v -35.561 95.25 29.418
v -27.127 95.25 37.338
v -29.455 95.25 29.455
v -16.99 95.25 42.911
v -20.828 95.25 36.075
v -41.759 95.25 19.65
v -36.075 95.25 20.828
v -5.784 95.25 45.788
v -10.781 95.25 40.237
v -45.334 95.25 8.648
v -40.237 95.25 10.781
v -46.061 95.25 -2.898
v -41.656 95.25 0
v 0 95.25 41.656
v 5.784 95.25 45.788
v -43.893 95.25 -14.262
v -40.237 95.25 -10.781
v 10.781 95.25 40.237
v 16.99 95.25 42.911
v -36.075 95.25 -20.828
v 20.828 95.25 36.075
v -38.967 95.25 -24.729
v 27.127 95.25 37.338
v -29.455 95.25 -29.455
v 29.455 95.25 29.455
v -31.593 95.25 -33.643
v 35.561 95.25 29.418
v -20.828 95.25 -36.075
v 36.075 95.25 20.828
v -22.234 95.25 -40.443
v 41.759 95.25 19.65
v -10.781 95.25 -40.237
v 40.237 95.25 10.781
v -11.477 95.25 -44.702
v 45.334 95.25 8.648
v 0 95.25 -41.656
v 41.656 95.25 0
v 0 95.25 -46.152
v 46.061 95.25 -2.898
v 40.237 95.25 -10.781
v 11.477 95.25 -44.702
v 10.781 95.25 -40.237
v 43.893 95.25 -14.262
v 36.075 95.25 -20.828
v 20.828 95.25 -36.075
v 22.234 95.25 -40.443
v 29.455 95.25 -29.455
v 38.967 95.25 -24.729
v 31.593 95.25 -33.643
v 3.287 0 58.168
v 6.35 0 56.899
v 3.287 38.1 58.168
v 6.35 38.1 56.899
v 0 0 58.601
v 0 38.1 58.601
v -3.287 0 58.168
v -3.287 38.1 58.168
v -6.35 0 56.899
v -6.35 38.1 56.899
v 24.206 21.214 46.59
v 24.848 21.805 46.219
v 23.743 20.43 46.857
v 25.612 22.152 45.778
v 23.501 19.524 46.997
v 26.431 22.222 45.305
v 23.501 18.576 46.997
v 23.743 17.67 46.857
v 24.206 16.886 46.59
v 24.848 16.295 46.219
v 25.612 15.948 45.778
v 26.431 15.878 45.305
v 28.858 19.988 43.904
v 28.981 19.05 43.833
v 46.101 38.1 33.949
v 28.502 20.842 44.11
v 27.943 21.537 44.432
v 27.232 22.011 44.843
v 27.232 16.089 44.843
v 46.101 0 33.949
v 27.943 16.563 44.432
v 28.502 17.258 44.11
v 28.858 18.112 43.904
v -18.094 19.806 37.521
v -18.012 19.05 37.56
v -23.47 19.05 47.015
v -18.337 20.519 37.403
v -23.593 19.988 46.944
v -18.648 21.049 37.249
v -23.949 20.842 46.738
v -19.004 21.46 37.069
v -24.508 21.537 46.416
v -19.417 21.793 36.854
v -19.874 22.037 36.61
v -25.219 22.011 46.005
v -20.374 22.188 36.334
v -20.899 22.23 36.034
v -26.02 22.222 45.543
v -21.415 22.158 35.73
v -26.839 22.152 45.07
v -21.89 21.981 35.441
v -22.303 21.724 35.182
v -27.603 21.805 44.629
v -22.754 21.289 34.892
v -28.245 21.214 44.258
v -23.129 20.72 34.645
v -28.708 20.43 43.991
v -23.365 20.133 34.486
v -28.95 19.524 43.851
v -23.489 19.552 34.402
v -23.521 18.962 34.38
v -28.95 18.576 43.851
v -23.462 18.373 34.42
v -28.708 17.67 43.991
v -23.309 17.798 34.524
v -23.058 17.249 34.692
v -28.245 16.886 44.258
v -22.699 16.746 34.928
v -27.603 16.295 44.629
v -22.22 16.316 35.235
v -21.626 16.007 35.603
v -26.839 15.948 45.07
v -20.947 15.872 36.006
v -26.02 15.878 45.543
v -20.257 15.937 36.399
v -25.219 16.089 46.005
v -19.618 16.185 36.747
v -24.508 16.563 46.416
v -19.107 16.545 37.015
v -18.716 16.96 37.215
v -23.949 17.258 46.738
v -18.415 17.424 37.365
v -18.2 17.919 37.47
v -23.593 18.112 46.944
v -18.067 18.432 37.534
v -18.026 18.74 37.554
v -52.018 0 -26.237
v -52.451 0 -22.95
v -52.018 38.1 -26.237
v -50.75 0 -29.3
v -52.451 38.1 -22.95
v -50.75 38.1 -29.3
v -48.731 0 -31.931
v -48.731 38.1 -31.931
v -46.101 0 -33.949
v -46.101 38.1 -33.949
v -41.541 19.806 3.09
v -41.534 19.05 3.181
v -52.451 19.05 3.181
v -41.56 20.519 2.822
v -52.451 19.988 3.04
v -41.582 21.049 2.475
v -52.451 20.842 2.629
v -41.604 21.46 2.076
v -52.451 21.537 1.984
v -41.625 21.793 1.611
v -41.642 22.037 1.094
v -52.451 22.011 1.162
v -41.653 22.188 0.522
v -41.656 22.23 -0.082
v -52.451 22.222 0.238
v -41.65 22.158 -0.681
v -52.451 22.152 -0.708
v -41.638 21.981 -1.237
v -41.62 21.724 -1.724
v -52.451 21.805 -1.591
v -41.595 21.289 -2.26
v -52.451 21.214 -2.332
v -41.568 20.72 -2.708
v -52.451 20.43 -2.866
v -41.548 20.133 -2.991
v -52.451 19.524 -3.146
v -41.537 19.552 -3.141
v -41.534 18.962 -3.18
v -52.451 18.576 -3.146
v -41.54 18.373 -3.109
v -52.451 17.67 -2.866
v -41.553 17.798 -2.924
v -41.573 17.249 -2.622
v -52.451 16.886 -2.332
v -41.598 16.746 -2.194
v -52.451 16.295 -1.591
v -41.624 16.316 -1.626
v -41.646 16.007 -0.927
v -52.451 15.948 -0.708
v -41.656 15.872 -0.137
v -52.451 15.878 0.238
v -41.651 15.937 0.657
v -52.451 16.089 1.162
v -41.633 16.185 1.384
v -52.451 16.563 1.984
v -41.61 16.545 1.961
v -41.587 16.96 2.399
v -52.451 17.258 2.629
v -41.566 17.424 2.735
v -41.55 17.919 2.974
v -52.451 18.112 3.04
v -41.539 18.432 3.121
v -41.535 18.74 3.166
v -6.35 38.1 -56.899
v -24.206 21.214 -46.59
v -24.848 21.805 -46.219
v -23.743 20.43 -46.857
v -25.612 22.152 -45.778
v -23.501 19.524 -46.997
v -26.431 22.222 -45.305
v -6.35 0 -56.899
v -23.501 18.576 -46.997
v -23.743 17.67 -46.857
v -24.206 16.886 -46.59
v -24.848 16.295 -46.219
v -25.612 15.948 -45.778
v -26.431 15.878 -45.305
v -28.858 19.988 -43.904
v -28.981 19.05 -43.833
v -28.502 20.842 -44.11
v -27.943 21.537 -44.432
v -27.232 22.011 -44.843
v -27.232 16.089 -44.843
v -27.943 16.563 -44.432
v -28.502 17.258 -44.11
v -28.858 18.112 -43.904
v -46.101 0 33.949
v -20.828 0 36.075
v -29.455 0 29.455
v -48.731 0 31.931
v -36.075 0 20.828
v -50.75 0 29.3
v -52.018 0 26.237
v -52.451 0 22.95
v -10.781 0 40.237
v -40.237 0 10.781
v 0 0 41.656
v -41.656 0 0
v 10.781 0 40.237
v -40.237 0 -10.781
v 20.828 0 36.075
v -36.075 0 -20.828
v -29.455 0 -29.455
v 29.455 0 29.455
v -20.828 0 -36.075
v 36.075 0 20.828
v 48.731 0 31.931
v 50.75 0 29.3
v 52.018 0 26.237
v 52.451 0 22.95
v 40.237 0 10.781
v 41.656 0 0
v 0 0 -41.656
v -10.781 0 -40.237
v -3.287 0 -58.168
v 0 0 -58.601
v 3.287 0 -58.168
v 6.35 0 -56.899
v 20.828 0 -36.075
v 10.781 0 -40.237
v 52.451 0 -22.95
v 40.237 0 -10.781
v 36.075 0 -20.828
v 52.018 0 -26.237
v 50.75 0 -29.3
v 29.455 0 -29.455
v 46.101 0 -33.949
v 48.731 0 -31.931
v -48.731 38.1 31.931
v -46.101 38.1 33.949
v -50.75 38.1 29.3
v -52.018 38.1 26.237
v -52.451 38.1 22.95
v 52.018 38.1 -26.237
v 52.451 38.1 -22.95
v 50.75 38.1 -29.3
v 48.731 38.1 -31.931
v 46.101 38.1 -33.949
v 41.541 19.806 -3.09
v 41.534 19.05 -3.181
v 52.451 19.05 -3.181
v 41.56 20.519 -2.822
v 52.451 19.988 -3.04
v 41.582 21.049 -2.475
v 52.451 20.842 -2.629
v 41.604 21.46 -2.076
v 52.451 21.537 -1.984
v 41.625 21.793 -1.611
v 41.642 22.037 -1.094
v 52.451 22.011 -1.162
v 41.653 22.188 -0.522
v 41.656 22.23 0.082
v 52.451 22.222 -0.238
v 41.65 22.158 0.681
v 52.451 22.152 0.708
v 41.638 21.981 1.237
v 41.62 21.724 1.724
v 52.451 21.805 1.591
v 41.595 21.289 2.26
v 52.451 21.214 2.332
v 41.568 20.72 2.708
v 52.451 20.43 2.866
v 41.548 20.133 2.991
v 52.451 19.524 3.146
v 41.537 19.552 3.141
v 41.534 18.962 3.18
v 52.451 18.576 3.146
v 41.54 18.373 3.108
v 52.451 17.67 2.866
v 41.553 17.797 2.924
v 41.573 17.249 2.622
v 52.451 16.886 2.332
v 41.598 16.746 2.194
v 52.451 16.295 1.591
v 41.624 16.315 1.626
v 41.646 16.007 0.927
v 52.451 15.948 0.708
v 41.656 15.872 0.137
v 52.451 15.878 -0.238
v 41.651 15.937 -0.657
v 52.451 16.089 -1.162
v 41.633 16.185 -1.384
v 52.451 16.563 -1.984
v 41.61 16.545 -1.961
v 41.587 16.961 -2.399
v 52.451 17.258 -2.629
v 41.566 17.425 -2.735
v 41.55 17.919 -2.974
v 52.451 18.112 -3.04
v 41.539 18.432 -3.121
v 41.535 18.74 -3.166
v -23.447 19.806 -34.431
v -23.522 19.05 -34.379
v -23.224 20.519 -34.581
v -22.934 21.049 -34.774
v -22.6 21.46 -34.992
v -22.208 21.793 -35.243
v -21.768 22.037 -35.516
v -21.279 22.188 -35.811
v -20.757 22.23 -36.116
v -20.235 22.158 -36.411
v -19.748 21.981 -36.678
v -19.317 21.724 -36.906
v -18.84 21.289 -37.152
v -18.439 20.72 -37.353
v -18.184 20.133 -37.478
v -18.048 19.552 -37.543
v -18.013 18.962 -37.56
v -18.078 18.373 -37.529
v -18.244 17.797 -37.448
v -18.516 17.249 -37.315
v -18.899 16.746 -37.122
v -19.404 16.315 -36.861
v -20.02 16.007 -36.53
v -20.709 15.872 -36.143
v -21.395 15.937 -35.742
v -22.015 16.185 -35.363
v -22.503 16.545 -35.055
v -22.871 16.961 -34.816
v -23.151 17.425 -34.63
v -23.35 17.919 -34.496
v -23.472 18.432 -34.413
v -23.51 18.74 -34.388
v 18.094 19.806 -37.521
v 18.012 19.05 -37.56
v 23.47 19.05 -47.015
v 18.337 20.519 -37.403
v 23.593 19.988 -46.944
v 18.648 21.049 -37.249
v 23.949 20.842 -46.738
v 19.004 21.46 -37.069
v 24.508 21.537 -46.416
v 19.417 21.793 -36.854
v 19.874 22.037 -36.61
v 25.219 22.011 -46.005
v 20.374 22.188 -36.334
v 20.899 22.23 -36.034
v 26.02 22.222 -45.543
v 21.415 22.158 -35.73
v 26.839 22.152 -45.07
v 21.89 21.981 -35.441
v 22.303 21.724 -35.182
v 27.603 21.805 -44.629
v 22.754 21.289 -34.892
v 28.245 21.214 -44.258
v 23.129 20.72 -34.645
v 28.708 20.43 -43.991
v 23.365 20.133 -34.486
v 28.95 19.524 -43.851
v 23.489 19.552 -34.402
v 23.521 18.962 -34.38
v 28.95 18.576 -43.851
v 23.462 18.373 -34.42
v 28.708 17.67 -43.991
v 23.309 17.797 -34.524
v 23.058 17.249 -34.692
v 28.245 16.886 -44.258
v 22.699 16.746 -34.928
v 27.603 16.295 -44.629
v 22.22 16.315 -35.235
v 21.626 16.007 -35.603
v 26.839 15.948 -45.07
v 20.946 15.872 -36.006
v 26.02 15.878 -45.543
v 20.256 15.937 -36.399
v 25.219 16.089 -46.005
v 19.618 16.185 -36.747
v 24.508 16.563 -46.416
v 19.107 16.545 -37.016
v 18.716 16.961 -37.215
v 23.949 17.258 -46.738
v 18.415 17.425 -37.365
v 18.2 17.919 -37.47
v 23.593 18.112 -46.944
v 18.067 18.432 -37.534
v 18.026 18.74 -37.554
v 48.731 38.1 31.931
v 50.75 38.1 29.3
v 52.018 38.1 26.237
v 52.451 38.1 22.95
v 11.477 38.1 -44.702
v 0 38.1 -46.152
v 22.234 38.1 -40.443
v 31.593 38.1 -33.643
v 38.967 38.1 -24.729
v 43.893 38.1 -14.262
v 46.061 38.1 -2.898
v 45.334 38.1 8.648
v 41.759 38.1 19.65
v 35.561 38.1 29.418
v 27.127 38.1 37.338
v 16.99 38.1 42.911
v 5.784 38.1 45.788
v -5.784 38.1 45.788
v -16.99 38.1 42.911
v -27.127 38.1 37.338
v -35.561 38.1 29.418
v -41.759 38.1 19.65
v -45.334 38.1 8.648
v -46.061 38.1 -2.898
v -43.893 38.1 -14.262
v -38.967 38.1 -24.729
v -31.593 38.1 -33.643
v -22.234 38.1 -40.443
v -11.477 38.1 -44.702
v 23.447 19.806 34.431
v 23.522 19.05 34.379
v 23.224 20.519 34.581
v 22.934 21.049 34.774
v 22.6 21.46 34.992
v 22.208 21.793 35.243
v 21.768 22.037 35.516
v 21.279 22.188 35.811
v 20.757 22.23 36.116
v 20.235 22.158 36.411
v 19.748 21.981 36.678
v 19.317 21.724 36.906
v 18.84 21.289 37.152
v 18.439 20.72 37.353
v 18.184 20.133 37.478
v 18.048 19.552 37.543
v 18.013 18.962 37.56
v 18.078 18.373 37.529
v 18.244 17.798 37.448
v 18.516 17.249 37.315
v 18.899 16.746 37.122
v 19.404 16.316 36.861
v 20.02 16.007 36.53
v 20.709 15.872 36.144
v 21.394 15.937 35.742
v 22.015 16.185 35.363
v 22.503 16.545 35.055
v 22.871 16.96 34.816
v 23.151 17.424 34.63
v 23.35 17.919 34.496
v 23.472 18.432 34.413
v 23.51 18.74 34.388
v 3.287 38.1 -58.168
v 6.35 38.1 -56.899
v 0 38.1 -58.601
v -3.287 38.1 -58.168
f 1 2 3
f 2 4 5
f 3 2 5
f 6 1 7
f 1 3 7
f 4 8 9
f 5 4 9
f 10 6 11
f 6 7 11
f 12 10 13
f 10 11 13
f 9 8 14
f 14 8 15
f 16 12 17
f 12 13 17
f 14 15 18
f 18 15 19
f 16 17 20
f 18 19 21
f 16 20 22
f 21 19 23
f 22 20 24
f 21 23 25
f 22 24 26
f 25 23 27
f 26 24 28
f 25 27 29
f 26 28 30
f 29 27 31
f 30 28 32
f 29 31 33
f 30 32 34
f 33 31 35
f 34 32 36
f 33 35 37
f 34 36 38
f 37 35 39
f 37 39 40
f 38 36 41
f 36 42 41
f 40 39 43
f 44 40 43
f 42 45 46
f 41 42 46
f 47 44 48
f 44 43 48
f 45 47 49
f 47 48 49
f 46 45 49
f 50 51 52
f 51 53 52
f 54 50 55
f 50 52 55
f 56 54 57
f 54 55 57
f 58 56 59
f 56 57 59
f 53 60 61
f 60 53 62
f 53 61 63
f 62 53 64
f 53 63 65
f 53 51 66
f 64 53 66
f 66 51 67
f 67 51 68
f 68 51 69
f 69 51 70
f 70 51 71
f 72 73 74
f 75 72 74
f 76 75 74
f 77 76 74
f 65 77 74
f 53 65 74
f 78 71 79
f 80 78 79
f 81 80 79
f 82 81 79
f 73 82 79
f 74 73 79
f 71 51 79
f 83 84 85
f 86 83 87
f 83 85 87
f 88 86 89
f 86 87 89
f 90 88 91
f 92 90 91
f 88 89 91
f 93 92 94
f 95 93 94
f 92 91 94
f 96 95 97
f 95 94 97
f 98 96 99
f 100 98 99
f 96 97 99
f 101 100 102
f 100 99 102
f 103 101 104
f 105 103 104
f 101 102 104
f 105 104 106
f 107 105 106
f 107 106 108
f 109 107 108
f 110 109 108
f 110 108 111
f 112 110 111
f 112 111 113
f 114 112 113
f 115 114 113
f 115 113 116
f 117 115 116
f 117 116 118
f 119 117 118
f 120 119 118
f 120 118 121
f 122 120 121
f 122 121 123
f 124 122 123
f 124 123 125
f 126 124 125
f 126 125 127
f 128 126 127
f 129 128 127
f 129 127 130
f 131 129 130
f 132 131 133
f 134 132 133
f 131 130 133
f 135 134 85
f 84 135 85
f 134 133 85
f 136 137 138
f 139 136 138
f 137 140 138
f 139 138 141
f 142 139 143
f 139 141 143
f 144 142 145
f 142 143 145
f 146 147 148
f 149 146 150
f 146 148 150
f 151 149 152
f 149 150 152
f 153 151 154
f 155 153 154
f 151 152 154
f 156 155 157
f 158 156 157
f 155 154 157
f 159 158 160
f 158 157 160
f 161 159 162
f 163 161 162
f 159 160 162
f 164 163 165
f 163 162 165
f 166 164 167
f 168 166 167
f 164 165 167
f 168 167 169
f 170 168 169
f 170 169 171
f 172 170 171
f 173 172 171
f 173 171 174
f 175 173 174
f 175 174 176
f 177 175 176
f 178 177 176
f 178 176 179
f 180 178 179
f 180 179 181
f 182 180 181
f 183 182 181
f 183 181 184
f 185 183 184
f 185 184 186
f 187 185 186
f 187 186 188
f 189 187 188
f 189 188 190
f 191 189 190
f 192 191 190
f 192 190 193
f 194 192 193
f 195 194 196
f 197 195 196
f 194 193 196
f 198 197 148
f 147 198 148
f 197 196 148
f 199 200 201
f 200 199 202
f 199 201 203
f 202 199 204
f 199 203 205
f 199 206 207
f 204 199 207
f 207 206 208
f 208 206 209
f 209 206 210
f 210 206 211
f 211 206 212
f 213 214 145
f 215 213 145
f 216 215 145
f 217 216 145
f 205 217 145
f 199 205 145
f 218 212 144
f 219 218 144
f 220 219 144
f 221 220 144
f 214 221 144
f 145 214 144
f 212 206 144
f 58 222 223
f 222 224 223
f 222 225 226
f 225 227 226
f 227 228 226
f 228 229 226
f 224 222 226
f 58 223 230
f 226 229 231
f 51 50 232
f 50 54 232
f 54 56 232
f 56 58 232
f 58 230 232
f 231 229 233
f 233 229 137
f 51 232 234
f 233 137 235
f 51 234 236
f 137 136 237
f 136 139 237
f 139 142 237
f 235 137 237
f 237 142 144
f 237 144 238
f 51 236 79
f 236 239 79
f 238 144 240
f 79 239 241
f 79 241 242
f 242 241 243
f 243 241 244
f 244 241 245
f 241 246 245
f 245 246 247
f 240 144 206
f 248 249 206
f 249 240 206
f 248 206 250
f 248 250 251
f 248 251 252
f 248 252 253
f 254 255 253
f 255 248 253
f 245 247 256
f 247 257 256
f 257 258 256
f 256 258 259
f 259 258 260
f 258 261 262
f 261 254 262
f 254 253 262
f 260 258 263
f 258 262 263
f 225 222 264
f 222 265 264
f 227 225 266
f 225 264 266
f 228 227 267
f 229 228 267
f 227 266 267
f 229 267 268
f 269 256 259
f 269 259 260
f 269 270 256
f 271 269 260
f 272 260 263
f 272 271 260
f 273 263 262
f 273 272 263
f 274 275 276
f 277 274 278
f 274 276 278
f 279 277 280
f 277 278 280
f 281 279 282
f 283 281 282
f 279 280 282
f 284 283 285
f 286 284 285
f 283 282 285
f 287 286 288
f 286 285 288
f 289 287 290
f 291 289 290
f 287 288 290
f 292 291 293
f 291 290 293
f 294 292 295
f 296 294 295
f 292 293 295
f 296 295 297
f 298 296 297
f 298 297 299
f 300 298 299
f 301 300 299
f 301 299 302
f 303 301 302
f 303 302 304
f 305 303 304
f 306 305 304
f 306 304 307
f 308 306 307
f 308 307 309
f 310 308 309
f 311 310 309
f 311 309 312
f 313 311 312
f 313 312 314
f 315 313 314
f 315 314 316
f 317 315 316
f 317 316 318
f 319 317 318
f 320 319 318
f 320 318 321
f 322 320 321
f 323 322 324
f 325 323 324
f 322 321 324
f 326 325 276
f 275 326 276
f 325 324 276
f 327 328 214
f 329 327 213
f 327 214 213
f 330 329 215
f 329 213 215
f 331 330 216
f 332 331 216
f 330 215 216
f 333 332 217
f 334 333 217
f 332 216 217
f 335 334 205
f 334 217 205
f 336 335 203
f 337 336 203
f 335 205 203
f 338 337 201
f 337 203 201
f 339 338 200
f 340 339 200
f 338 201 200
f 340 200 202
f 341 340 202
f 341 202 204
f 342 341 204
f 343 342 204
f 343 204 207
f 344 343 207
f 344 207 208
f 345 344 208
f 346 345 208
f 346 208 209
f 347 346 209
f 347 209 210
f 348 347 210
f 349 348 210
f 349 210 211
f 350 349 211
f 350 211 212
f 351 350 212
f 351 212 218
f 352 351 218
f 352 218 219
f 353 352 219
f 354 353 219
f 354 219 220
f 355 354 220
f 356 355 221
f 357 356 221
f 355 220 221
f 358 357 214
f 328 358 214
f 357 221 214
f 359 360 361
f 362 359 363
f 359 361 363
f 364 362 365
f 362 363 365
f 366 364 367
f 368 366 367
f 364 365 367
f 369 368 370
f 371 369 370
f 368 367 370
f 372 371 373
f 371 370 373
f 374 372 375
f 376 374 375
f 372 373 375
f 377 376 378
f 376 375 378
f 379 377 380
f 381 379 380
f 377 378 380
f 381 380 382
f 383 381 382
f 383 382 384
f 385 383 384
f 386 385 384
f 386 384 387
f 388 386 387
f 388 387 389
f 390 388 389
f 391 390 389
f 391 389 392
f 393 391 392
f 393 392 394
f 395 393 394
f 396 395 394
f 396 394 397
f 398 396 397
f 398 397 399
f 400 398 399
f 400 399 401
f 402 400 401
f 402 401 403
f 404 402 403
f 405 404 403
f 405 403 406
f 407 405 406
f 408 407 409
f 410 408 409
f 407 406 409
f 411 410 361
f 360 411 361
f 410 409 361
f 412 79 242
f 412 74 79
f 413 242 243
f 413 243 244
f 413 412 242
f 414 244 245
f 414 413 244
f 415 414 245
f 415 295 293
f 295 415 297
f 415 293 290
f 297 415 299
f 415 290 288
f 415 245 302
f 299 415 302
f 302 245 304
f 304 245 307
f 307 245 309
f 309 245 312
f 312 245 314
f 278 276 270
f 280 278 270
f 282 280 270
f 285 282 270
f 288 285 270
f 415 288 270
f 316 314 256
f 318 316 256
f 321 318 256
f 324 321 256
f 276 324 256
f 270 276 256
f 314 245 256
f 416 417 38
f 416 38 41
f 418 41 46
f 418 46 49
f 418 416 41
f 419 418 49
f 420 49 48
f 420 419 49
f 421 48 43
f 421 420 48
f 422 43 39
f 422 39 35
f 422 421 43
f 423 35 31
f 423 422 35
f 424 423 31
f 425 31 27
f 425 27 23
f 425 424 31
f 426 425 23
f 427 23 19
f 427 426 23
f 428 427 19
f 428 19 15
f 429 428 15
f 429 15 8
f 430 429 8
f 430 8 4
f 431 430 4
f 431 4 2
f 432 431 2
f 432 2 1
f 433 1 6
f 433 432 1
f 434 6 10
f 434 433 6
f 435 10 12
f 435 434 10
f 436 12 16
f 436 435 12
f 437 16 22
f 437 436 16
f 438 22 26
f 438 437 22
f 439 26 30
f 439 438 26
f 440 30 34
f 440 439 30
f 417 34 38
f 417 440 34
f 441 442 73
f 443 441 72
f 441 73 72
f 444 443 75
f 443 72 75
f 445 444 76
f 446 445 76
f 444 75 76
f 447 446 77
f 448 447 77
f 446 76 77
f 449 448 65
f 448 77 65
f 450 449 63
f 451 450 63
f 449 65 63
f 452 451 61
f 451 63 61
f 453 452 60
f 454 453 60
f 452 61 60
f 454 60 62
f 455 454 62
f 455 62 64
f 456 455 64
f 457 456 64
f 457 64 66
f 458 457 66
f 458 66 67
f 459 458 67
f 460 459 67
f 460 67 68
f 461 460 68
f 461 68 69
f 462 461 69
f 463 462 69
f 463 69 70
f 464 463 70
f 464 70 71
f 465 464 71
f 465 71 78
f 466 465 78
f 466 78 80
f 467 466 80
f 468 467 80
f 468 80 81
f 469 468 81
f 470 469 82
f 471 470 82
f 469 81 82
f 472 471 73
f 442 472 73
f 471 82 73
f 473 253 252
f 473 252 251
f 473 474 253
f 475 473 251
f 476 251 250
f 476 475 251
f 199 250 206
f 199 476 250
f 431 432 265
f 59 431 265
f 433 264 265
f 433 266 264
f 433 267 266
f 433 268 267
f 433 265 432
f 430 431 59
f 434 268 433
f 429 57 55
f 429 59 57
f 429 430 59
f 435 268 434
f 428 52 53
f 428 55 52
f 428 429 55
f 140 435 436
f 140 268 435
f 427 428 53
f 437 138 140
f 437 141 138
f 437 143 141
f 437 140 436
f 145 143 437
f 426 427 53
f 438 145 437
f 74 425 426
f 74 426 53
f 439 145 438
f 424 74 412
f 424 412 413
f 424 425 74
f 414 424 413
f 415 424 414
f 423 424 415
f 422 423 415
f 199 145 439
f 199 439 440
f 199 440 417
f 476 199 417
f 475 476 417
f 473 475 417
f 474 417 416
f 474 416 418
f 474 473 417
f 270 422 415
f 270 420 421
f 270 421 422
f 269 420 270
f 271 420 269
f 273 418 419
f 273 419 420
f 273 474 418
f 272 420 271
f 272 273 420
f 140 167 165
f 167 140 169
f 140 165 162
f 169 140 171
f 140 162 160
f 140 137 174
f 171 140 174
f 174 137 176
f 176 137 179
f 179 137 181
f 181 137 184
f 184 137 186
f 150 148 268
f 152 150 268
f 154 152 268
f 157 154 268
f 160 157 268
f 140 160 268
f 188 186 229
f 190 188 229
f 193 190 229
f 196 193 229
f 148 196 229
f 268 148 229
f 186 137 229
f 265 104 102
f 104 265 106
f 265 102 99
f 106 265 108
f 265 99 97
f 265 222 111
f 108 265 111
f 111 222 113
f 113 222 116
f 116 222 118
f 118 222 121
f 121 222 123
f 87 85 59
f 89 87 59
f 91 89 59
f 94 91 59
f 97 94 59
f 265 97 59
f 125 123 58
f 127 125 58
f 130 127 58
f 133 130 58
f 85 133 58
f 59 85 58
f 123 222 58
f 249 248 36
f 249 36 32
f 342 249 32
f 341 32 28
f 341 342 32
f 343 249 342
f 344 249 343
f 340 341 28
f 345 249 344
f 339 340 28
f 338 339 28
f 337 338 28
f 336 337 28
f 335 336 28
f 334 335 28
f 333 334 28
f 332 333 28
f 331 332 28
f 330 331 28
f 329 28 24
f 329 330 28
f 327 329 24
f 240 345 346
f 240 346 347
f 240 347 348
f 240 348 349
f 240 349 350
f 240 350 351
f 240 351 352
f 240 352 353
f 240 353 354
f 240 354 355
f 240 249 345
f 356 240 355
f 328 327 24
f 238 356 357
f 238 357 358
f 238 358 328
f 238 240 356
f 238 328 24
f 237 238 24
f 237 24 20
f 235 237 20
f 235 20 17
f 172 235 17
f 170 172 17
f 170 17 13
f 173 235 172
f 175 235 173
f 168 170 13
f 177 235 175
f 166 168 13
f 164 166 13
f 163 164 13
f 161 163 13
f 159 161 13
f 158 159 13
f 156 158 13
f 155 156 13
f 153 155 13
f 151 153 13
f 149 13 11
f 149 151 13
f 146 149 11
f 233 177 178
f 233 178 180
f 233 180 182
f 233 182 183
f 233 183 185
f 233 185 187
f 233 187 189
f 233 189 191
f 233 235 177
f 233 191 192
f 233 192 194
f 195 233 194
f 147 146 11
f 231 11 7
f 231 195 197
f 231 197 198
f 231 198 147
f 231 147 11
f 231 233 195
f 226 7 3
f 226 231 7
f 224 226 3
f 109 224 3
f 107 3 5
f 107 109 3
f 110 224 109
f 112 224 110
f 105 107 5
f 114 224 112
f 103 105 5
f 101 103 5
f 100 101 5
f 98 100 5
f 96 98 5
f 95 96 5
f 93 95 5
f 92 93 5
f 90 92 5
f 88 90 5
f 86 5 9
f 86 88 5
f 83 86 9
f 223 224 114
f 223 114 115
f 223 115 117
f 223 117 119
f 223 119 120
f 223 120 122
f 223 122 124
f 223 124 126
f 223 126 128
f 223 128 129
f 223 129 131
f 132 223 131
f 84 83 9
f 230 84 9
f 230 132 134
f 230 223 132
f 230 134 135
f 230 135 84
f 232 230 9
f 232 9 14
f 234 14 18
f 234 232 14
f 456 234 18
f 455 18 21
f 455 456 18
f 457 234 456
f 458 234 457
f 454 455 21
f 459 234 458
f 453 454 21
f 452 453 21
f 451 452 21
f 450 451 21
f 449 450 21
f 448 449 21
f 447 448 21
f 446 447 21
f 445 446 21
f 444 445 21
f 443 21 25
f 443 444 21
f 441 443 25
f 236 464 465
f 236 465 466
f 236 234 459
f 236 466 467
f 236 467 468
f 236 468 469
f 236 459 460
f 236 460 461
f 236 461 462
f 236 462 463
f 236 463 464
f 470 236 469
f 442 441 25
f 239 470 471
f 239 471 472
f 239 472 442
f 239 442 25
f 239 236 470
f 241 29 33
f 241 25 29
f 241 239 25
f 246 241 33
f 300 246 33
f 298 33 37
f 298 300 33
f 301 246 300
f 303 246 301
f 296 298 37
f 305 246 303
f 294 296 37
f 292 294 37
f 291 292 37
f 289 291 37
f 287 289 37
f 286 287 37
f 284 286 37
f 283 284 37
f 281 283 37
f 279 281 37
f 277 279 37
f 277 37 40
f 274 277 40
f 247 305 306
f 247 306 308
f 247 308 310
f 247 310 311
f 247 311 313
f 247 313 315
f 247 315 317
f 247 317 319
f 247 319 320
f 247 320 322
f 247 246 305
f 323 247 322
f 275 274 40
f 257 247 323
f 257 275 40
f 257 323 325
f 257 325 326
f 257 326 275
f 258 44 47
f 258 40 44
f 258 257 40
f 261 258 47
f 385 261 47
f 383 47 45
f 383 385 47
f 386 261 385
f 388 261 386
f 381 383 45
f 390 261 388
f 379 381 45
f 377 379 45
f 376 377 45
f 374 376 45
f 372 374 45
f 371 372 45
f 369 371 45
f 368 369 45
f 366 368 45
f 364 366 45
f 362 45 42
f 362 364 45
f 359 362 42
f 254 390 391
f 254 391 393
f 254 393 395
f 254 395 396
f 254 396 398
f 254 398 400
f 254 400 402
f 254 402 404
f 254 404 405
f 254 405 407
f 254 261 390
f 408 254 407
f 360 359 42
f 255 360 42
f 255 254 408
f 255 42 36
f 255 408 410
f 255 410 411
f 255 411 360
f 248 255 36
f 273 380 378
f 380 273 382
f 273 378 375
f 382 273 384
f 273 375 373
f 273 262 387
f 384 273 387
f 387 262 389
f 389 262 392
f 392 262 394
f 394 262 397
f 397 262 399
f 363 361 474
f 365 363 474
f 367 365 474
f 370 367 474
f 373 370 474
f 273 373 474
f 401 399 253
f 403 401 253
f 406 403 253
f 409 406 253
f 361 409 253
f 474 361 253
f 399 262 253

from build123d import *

# Parameters (mm, degrees)
SKETCH1_R           = 41.656
BOSS_EXTRUDE1_DEPTH = 38.1
SKETCH2_R           = 3.18135
CUT_EXTRUDE1_DEPTH  = 29.464
CIRPATTERN1_COUNT   = 6
SKETCH3_R           = 46.1518
SKETCH3_R_2         = 41.656
BOSS_EXTRUDE2_DEPTH = 57.15
FILLET1_R           = 12.7


with BuildPart() as part:
    # Sketch1 → Boss-Extrude1 (new body)
    with BuildSketch(Plane(origin=(0, 0, 0), x_dir=(1, 0, 0), z_dir=(0, 1, 0))):
        Polygon((0, -60.565197939), (52.451, -30.282598969), (52.451, 30.282598969), (0, 60.565197939), (-52.451, 30.282598969), (-52.451, -30.282598969), align=None)
        with Locations(Location((0, 0, 0), (0, 0, 90))):
            Circle(SKETCH1_R, mode=Mode.SUBTRACT)
    extrude(amount=BOSS_EXTRUDE1_DEPTH)

    # Sketch2 → Cut-Extrude1 (cut)
    with BuildSketch(Plane.ZY.offset(52.451)):
        with Locations((0, 19.05)):
            Circle(SKETCH2_R)
    cut_extrude1 = extrude(amount=-CUT_EXTRUDE1_DEPTH, mode=Mode.SUBTRACT)

    # CirPattern1: Cut-Extrude1 ×6 about axis
    cirpattern1_axis = Axis((0, 38.1, 0), (0, 1, 0))
    for i in range(1, CIRPATTERN1_COUNT):
        add(cut_extrude1.rotate(cirpattern1_axis, i * 360 / CIRPATTERN1_COUNT), mode=Mode.SUBTRACT)

    # Sketch3 → Boss-Extrude2 (add)
    with BuildSketch(Plane(origin=(-52.451, 38.1, -30.282598969), x_dir=(1, 0, 0), z_dir=(0, -1, 0))):
        with Locations(Location((52.451, 30.282598969, 0), (0, 0, 270))):
            Circle(SKETCH3_R)
        with Locations(Location((52.451, 30.282598969, 0), (0, 0, 270))):
            Circle(SKETCH3_R_2, mode=Mode.SUBTRACT)
    extrude(amount=-BOSS_EXTRUDE2_DEPTH)

    # Fillet1
    fillet1_edges = [part.edges().sort_by_distance(p)[0] for p in [
        (-52.451, 19.05, 30.282598969),
        (-52.451, 19.05, -30.282598969),
        (0, 19.05, -60.565197939),
        (52.451, 19.05, -30.282598969),
        (52.451, 19.05, 30.282598969),
        (0, 19.05, 60.565197939),
    ]]
    fillet(fillet1_edges, radius=FILLET1_R)


solid = part.part
